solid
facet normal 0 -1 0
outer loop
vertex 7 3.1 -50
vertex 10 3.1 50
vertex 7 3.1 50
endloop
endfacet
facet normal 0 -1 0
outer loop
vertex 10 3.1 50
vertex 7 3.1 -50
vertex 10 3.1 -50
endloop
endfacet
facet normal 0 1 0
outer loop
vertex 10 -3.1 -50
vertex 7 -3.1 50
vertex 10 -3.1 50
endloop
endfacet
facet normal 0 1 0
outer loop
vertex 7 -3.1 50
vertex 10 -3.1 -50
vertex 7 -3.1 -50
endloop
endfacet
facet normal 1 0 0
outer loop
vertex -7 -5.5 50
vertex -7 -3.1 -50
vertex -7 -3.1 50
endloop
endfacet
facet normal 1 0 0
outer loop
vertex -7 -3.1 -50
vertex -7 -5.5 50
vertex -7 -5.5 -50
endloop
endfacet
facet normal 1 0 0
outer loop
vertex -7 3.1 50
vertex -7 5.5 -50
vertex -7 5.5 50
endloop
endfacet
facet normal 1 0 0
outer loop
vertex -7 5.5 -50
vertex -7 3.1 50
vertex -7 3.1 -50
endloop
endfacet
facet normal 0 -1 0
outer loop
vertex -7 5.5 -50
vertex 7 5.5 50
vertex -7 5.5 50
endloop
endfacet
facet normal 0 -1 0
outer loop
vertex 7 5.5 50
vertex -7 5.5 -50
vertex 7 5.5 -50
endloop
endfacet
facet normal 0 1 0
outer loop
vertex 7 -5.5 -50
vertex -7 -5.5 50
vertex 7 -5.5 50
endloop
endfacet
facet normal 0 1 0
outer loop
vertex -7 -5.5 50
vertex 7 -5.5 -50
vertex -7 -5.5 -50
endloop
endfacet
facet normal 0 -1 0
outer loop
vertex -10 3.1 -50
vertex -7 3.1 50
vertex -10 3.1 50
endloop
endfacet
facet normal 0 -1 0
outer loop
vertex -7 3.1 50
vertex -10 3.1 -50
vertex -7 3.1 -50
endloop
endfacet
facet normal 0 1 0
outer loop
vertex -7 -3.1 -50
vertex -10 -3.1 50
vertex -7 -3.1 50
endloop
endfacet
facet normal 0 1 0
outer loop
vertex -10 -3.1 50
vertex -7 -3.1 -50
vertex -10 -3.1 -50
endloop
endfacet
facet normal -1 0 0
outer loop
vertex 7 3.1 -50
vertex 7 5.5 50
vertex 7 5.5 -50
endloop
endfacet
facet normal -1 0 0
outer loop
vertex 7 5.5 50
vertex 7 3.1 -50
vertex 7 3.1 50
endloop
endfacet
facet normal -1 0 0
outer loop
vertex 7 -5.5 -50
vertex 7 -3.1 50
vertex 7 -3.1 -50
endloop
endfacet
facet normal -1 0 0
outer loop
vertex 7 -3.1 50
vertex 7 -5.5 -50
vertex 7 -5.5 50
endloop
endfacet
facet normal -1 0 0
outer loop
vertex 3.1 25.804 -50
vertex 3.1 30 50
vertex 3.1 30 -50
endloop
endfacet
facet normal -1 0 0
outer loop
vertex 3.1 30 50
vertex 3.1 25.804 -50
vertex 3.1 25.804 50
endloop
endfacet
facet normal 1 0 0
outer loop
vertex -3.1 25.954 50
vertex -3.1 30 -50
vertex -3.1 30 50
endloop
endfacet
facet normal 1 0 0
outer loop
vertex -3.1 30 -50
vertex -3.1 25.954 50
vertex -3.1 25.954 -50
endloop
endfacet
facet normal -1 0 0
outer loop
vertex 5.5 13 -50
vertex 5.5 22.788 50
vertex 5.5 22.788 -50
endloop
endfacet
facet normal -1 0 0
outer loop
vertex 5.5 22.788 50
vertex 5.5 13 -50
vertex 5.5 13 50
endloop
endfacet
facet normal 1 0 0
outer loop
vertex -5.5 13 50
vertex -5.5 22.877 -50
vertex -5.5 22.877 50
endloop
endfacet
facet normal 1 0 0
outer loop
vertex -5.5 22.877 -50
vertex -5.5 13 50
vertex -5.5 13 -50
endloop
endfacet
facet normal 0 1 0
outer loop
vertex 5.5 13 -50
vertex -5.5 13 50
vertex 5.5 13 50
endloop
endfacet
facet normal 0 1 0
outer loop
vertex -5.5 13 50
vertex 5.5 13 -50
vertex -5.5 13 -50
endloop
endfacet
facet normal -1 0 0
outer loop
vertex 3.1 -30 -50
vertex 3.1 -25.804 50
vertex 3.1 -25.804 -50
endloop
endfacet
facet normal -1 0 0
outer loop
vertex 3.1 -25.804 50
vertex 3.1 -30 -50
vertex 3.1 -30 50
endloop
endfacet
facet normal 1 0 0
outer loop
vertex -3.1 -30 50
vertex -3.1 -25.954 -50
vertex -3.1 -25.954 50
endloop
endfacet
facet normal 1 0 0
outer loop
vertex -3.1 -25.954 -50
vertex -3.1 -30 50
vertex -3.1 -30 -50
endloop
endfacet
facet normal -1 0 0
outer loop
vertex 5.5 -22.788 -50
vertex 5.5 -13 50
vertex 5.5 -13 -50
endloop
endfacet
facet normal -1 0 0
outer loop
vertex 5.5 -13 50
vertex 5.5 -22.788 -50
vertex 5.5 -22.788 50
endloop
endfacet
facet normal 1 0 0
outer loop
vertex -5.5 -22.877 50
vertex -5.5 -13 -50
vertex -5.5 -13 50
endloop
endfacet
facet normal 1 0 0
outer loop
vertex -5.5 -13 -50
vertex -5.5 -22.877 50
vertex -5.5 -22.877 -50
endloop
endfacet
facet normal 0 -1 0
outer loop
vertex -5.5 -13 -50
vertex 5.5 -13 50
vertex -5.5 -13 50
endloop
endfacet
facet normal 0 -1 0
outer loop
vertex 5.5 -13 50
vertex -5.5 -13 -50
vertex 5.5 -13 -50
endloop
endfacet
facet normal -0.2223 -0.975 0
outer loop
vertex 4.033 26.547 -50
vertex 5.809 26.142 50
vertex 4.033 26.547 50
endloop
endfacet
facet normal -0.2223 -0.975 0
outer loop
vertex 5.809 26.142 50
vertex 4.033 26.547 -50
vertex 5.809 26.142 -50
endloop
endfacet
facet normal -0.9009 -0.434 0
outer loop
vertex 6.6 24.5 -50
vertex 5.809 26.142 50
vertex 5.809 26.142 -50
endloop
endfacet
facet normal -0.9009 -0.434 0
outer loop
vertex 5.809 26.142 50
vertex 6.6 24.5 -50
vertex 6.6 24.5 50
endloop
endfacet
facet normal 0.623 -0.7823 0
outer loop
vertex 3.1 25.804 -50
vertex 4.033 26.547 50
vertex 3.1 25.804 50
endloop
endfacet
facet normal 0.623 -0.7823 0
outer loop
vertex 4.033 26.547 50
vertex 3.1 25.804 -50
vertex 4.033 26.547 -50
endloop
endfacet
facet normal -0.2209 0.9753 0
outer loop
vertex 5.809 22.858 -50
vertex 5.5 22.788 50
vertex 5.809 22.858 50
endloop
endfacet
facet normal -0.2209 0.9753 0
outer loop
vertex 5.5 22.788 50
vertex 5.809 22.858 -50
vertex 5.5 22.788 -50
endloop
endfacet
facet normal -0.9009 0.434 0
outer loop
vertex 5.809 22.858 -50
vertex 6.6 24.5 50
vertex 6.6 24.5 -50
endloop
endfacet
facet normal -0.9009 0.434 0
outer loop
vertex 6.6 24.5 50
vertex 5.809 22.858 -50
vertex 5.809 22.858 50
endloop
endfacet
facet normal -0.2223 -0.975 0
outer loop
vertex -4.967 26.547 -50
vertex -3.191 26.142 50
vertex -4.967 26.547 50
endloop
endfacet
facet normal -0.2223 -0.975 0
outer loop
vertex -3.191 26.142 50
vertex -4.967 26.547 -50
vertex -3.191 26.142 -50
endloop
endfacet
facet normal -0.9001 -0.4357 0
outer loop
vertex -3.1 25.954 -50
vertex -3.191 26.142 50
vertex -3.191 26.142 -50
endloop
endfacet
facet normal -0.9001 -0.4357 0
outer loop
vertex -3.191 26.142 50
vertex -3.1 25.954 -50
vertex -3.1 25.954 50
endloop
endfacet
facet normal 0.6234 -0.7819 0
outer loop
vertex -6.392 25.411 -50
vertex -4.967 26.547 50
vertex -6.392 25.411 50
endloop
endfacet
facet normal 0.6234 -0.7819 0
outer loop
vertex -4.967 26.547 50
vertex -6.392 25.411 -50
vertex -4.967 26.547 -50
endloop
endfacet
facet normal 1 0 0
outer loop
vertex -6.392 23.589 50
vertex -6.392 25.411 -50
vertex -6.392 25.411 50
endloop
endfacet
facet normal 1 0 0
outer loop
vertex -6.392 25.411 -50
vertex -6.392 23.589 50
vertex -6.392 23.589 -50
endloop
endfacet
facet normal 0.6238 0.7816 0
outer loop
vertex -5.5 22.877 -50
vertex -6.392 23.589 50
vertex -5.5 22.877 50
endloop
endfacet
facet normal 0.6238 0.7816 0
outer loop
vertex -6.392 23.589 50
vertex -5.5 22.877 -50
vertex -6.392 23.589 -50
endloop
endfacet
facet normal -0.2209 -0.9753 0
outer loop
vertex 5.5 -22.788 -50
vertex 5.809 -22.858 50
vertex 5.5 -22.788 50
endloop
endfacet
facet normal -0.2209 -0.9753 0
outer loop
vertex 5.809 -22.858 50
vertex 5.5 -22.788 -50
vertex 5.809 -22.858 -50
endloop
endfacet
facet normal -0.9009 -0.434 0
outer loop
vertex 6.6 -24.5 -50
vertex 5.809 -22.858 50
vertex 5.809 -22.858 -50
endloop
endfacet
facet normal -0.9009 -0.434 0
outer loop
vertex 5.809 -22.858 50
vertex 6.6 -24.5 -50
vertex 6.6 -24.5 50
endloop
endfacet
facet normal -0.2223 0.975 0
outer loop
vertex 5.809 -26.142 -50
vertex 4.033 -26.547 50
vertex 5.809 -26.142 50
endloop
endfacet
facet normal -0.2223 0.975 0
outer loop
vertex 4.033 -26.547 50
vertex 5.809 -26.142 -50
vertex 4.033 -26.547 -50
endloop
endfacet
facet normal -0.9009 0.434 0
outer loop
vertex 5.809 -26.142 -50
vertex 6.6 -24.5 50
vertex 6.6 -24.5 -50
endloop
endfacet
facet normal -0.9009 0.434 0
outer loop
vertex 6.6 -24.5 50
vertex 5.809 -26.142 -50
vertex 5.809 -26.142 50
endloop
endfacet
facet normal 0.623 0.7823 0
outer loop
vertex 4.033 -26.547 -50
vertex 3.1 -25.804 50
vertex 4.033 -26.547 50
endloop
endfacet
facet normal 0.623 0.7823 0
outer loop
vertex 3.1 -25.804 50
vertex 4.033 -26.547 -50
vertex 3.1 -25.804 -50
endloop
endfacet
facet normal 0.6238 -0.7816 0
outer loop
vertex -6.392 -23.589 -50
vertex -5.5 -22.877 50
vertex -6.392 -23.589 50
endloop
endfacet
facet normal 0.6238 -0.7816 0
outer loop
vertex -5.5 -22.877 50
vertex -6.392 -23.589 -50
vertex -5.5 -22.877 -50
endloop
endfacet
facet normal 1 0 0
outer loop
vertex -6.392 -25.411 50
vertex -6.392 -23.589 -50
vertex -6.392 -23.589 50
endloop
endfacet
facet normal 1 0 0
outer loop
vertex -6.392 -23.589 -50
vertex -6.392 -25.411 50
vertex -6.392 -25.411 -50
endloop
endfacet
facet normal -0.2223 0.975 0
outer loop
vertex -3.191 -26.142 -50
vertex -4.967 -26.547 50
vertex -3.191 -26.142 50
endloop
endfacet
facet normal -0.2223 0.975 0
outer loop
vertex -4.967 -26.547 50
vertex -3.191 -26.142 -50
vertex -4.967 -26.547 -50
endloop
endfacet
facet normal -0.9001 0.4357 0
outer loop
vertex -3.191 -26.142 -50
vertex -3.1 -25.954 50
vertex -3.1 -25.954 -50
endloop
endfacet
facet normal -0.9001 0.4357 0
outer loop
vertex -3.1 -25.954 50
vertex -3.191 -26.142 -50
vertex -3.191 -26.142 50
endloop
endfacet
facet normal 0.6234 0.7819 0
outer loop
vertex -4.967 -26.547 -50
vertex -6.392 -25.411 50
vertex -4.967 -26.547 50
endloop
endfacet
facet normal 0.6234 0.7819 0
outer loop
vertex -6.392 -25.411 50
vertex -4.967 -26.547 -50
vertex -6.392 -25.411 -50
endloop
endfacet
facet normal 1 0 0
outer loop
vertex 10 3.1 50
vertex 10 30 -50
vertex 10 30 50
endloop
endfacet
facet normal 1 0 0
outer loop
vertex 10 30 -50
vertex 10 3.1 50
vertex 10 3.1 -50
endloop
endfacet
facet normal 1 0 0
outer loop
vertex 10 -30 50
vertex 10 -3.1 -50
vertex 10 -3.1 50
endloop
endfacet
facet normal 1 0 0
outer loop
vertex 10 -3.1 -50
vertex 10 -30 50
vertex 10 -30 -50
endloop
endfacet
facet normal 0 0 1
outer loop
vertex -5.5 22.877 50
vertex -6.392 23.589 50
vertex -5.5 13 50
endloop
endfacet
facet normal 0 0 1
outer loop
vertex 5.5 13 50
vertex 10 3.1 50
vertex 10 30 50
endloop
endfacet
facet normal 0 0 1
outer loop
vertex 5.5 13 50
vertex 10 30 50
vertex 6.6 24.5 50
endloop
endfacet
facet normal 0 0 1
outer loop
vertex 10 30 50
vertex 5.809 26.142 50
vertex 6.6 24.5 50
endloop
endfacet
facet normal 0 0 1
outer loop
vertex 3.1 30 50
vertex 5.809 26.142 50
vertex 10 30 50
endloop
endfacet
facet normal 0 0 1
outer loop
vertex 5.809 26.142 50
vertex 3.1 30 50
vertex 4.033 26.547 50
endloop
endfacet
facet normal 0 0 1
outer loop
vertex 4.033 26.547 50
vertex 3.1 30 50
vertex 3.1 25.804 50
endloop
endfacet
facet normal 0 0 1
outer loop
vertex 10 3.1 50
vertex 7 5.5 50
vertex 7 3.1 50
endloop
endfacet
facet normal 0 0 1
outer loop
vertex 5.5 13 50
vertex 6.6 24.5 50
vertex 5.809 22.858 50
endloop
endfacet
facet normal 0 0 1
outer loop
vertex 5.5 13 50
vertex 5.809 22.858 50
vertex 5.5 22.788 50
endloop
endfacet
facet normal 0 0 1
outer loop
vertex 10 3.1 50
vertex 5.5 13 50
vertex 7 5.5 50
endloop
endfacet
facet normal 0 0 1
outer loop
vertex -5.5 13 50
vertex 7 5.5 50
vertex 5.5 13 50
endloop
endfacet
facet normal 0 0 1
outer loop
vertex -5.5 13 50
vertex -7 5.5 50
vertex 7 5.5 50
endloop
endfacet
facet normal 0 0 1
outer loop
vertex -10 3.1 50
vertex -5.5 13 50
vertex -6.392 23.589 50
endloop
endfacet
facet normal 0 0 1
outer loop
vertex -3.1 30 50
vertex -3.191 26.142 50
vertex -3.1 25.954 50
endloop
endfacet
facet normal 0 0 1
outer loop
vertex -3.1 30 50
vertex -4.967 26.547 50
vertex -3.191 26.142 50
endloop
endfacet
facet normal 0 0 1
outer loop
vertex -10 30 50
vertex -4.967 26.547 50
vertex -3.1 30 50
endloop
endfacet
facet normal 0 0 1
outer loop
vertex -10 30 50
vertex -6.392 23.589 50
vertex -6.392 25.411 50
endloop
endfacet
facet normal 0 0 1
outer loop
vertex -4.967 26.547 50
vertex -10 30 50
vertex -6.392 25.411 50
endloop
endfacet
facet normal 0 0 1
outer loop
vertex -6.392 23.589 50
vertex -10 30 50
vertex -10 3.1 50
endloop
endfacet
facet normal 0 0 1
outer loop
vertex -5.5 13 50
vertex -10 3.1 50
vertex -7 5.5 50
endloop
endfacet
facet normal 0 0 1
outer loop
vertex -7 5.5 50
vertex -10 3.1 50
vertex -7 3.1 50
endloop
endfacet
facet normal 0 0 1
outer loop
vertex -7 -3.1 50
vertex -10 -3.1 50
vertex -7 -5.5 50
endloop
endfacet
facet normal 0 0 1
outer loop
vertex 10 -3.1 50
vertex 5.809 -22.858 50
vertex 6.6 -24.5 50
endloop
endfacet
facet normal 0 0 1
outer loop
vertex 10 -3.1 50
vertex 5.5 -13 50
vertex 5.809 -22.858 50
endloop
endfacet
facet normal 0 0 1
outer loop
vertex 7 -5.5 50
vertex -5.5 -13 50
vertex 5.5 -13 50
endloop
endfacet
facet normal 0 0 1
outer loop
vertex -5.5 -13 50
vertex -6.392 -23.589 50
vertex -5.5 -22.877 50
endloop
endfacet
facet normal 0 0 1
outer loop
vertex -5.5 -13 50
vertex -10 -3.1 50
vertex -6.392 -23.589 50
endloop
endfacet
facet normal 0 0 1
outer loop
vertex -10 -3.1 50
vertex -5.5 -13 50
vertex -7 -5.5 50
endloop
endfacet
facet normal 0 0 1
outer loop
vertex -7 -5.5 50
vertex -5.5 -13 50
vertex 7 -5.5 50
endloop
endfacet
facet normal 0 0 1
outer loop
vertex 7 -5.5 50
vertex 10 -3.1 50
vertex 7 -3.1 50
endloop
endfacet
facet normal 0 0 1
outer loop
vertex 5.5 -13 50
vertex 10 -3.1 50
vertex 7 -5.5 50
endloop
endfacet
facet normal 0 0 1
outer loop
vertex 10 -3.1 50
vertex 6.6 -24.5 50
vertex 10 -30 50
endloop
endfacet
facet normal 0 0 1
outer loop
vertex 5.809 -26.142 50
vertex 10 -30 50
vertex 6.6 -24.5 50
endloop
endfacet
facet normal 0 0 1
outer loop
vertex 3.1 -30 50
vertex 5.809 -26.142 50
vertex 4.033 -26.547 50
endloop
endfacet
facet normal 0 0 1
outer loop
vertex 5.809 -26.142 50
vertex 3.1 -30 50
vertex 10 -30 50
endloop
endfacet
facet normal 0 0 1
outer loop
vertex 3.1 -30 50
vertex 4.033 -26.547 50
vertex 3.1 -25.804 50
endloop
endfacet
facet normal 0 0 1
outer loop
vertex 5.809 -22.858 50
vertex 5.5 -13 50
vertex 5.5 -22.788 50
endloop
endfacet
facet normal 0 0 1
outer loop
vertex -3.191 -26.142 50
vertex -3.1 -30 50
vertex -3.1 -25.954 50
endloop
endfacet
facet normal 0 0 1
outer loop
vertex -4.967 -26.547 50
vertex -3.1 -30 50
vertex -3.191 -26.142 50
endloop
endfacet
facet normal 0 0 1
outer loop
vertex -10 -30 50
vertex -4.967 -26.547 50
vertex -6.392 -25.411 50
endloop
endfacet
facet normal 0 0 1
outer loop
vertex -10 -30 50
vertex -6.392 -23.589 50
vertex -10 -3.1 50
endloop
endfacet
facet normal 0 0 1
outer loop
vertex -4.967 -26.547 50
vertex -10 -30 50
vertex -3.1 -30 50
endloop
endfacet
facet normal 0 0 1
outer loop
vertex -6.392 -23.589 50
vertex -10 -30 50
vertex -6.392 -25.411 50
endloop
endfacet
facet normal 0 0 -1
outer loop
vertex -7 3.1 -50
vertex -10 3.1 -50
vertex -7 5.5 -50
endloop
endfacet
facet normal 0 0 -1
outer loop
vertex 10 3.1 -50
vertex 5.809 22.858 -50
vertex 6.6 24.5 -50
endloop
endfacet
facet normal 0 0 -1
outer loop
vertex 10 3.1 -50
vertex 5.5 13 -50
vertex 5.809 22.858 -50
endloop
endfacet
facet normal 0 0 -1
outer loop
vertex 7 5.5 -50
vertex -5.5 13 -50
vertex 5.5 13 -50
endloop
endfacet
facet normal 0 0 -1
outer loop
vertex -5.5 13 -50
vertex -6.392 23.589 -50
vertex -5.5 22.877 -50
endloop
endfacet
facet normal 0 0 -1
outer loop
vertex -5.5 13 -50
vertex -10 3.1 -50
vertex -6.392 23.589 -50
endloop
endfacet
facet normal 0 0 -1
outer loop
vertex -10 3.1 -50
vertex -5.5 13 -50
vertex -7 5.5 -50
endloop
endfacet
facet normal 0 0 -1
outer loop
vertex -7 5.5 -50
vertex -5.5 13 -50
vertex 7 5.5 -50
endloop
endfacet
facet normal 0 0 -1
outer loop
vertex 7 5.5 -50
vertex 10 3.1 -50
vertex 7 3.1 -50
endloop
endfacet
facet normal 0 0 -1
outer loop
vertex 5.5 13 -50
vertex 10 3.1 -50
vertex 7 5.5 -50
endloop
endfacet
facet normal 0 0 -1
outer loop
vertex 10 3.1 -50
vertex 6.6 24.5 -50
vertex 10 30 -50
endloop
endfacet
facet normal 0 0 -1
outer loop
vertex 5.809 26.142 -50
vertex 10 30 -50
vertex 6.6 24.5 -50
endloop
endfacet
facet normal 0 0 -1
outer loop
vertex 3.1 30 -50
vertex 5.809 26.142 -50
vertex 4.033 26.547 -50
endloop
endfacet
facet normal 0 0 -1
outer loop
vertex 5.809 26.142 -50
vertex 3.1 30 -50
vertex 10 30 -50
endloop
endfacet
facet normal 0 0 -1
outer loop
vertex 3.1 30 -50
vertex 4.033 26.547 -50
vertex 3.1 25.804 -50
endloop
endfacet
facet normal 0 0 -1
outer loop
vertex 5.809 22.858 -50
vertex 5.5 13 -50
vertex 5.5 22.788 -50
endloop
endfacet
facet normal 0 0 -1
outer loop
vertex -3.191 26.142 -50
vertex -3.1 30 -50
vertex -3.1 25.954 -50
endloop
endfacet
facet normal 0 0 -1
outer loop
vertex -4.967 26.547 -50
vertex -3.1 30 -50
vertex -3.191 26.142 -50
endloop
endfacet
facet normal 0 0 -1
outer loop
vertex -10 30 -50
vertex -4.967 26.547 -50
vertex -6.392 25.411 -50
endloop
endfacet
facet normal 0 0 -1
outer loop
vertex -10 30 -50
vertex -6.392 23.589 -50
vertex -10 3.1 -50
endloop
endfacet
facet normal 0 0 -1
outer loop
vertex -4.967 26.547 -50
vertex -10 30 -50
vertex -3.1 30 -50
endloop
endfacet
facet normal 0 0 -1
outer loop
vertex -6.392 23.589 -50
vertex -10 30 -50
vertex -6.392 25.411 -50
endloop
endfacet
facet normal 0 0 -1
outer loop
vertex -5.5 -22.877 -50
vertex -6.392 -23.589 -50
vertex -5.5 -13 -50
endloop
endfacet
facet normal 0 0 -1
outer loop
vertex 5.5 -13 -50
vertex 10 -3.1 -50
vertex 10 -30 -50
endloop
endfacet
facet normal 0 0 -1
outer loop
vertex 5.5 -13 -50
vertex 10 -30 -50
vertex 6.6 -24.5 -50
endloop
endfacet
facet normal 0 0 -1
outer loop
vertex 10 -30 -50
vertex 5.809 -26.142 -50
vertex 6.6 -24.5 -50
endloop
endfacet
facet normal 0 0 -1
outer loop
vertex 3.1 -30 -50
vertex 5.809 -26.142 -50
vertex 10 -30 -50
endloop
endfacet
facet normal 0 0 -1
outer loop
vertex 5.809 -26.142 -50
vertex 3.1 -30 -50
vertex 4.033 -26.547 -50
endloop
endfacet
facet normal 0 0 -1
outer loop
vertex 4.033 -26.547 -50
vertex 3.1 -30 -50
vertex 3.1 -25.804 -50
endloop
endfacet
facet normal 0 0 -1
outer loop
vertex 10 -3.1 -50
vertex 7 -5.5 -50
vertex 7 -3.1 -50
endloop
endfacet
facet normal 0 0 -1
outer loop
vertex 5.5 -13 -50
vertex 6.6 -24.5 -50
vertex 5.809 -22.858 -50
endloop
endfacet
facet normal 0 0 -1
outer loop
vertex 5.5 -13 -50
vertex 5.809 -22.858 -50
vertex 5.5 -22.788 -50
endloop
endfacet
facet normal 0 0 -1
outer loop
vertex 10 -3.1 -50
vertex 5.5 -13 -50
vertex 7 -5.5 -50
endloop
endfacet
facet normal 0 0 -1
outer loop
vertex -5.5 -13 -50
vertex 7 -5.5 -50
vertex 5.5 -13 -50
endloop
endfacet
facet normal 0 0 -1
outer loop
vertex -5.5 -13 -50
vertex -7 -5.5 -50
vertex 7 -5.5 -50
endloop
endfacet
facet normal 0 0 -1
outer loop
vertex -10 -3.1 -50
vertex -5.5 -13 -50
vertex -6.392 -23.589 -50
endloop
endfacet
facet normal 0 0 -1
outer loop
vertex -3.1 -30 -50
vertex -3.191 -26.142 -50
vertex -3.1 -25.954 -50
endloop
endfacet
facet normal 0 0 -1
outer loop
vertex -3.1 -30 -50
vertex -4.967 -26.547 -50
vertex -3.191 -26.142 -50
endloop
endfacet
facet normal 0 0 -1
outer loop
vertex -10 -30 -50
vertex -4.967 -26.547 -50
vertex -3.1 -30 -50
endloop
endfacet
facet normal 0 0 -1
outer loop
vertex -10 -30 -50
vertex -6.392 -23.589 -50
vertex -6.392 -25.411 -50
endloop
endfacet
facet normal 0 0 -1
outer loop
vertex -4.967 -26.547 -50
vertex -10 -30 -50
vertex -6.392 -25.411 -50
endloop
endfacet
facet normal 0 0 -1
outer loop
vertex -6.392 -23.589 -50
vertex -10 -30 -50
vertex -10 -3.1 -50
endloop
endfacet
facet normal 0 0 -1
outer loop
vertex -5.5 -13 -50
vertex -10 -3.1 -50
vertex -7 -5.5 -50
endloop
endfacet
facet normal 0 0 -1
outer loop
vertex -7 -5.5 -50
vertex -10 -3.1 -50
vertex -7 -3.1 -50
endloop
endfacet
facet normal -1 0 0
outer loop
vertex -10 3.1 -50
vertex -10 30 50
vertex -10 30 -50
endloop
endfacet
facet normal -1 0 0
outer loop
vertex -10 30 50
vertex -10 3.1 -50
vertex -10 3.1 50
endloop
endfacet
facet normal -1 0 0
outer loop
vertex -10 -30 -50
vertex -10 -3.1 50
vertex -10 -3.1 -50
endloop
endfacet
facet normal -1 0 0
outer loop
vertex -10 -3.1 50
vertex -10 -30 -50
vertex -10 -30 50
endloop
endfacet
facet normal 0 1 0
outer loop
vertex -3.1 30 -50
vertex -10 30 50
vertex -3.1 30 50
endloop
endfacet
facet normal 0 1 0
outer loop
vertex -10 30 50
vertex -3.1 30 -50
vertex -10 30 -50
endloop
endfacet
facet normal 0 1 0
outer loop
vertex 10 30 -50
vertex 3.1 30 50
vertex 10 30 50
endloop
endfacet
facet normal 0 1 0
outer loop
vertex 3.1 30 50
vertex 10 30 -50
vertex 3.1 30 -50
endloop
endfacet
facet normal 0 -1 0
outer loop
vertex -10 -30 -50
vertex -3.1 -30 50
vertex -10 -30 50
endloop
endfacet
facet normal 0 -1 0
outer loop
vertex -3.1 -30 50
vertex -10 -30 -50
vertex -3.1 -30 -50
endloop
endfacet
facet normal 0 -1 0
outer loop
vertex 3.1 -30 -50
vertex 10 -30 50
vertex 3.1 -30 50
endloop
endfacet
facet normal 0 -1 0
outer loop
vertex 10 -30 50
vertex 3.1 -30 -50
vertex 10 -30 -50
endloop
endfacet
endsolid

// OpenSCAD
// Parameters
cross_section_width_mm = 20; //[10:40:1]
cross_section_height_mm = 60; //[30:120:1]
length_mm = 100; //[50:200:1]
center_along_length = 1; //[0:1:1]
include_corner_holes = 1; //[0:1:1]
wall_thickness_mm = 2.2; //[1.2:4.4:0.1]
slot_opening_mm = 6.2; //[4:10:0.1]
slot_depth_mm = 6.5; //[3:12:0.1]
slot_cavity_width_mm = 11.0; //[7:16:0.1]
slot_cavity_depth_mm = 10.0; //[6:16:0.1]
web_thickness_mm = 2.0; //[1.2:4.0:0.1]
center_bore_diameter_mm = 5.2; //[3:10:0.1]
corner_hole_diameter_mm = 4.2; //[2:8:0.1]
corner_hole_inset_mm = 5.5; //[3:11:0.1]
overlap_mm = 1.0; //[0.5:2.0:0.1]

// Extrusion Cross Section
module extrusion_cross_section() {
  color("Silver") {
    difference() {
      // Main profile
      cube([cross_section_width_mm, cross_section_height_mm, length_mm], center=true);
      
      // T-slot channels
      union() {
        translate([cross_section_width_mm/2 - (slot_depth_mm + overlap_mm)/2 + overlap_mm/2, 0, 0])
          cube([slot_depth_mm + overlap_mm, slot_opening_mm, length_mm + 2*overlap_mm], center=true);
        translate([cross_section_width_mm/2 - slot_depth_mm - (slot_cavity_depth_mm + overlap_mm)/2 + overlap_mm/2, 0, 0])
          cube([slot_cavity_depth_mm + overlap_mm, slot_cavity_width_mm, length_mm + 2*overlap_mm], center=true);
        translate([-(cross_section_width_mm/2 - (slot_depth_mm + overlap_mm)/2 + overlap_mm/2), 0, 0])
          cube([slot_depth_mm + overlap_mm, slot_opening_mm, length_mm + 2*overlap_mm], center=true);
        translate([-(cross_section_width_mm/2 - slot_depth_mm - (slot_cavity_depth_mm + overlap_mm)/2 + overlap_mm/2), 0, 0])
          cube([slot_cavity_depth_mm + overlap_mm, slot_cavity_width_mm, length_mm + 2*overlap_mm], center=true);
        translate([0, cross_section_height_mm/2 - (slot_depth_mm + overlap_mm)/2 + overlap_mm/2, 0])
          cube([slot_opening_mm, slot_depth_mm + overlap_mm, length_mm + 2*overlap_mm], center=true);
        translate([0, cross_section_height_mm/2 - slot_depth_mm - (slot_cavity_depth_mm + overlap_mm)/2 + overlap_mm/2, 0])
          cube([slot_cavity_width_mm, slot_cavity_depth_mm + overlap_mm, length_mm + 2*overlap_mm], center=true);
        translate([0, -(cross_section_height_mm/2 - (slot_depth_mm + overlap_mm)/2 + overlap_mm/2), 0])
          cube([slot_opening_mm, slot_depth_mm + overlap_mm, length_mm + 2*overlap_mm], center=true);
        translate([0, -(cross_section_height_mm/2 - slot_depth_mm - (slot_cavity_depth_mm + overlap_mm)/2 + overlap_mm/2), 0])
          cube([slot_cavity_width_mm, slot_cavity_depth_mm + overlap_mm, length_mm + 2*overlap_mm], center=true);
      }
      
      // Center bore
      translate([0, 0, 0])
        cylinder(r=center_bore_diameter_mm/2, h=length_mm + 2*overlap_mm, center=true);
      
      // Corner holes
      if (include_corner_holes) {
        union() {
          translate([cross_section_width_mm/2 - corner_hole_inset_mm, cross_section_height_mm/2 - corner_hole_inset_mm, 0])
            cylinder(r=corner_hole_diameter_mm/2, h=length_mm + 2*overlap_mm, center=true);
          translate([-(cross_section_width_mm/2 - corner_hole_inset_mm), cross_section_height_mm/2 - corner_hole_inset_mm, 0])
            cylinder(r=corner_hole_diameter_mm/2, h=length_mm + 2*overlap_mm, center=true);
          translate([cross_section_width_mm/2 - corner_hole_inset_mm, -(cross_section_height_mm/2 - corner_hole_inset_mm), 0])
            cylinder(r=corner_hole_diameter_mm/2, h=length_mm + 2*overlap_mm, center=true);
          translate([-(cross_section_width_mm/2 - corner_hole_inset_mm), -(cross_section_height_mm/2 - corner_hole_inset_mm), 0])
            cylinder(r=corner_hole_diameter_mm/2, h=length_mm + 2*overlap_mm, center=true);
        }
      }
    }
  }
}

// Box Corner Profile Section
module box_corner_profile_section() {
  color("DimGray") {
    union() {
      translate([cross_section_width_mm/2 - wall_thickness_mm/2, cross_section_height_mm/2 - wall_thickness_mm/2, 0])
        cube([wall_thickness_mm, wall_thickness_mm, length_mm], center=true);
      translate([-(cross_section_width_mm/2 - wall_thickness_mm/2), cross_section_height_mm/2 - wall_thickness_mm/2, 0])
        cube([wall_thickness_mm, wall_thickness_mm, length_mm], center=true);
      translate([cross_section_width_mm/2 - wall_thickness_mm/2, -(cross_section_height_mm/2 - wall_thickness_mm/2), 0])
        cube([wall_thickness_mm, wall_thickness_mm, length_mm], center=true);
      translate([-(cross_section_width_mm/2 - wall_thickness_mm/2), -(cross_section_height_mm/2 - wall_thickness_mm/2), 0])
        cube([wall_thickness_mm, wall_thickness_mm, length_mm], center=true);
    }
  }
}

// Box Corner Profile Sections
module box_corner_profile_sections() {
  color("DimGray") {
    box_corner_profile_section();
  }
}

// Extrusion
module extrusion() {
  color("Silver") {
    translate([0, 0, (1-center_along_length)*length_mm/2])
      extrusion_cross_section();
    box_corner_profile_sections();
  }
}

// Assembly
module assembly() {
  extrusion();
}

assembly();
